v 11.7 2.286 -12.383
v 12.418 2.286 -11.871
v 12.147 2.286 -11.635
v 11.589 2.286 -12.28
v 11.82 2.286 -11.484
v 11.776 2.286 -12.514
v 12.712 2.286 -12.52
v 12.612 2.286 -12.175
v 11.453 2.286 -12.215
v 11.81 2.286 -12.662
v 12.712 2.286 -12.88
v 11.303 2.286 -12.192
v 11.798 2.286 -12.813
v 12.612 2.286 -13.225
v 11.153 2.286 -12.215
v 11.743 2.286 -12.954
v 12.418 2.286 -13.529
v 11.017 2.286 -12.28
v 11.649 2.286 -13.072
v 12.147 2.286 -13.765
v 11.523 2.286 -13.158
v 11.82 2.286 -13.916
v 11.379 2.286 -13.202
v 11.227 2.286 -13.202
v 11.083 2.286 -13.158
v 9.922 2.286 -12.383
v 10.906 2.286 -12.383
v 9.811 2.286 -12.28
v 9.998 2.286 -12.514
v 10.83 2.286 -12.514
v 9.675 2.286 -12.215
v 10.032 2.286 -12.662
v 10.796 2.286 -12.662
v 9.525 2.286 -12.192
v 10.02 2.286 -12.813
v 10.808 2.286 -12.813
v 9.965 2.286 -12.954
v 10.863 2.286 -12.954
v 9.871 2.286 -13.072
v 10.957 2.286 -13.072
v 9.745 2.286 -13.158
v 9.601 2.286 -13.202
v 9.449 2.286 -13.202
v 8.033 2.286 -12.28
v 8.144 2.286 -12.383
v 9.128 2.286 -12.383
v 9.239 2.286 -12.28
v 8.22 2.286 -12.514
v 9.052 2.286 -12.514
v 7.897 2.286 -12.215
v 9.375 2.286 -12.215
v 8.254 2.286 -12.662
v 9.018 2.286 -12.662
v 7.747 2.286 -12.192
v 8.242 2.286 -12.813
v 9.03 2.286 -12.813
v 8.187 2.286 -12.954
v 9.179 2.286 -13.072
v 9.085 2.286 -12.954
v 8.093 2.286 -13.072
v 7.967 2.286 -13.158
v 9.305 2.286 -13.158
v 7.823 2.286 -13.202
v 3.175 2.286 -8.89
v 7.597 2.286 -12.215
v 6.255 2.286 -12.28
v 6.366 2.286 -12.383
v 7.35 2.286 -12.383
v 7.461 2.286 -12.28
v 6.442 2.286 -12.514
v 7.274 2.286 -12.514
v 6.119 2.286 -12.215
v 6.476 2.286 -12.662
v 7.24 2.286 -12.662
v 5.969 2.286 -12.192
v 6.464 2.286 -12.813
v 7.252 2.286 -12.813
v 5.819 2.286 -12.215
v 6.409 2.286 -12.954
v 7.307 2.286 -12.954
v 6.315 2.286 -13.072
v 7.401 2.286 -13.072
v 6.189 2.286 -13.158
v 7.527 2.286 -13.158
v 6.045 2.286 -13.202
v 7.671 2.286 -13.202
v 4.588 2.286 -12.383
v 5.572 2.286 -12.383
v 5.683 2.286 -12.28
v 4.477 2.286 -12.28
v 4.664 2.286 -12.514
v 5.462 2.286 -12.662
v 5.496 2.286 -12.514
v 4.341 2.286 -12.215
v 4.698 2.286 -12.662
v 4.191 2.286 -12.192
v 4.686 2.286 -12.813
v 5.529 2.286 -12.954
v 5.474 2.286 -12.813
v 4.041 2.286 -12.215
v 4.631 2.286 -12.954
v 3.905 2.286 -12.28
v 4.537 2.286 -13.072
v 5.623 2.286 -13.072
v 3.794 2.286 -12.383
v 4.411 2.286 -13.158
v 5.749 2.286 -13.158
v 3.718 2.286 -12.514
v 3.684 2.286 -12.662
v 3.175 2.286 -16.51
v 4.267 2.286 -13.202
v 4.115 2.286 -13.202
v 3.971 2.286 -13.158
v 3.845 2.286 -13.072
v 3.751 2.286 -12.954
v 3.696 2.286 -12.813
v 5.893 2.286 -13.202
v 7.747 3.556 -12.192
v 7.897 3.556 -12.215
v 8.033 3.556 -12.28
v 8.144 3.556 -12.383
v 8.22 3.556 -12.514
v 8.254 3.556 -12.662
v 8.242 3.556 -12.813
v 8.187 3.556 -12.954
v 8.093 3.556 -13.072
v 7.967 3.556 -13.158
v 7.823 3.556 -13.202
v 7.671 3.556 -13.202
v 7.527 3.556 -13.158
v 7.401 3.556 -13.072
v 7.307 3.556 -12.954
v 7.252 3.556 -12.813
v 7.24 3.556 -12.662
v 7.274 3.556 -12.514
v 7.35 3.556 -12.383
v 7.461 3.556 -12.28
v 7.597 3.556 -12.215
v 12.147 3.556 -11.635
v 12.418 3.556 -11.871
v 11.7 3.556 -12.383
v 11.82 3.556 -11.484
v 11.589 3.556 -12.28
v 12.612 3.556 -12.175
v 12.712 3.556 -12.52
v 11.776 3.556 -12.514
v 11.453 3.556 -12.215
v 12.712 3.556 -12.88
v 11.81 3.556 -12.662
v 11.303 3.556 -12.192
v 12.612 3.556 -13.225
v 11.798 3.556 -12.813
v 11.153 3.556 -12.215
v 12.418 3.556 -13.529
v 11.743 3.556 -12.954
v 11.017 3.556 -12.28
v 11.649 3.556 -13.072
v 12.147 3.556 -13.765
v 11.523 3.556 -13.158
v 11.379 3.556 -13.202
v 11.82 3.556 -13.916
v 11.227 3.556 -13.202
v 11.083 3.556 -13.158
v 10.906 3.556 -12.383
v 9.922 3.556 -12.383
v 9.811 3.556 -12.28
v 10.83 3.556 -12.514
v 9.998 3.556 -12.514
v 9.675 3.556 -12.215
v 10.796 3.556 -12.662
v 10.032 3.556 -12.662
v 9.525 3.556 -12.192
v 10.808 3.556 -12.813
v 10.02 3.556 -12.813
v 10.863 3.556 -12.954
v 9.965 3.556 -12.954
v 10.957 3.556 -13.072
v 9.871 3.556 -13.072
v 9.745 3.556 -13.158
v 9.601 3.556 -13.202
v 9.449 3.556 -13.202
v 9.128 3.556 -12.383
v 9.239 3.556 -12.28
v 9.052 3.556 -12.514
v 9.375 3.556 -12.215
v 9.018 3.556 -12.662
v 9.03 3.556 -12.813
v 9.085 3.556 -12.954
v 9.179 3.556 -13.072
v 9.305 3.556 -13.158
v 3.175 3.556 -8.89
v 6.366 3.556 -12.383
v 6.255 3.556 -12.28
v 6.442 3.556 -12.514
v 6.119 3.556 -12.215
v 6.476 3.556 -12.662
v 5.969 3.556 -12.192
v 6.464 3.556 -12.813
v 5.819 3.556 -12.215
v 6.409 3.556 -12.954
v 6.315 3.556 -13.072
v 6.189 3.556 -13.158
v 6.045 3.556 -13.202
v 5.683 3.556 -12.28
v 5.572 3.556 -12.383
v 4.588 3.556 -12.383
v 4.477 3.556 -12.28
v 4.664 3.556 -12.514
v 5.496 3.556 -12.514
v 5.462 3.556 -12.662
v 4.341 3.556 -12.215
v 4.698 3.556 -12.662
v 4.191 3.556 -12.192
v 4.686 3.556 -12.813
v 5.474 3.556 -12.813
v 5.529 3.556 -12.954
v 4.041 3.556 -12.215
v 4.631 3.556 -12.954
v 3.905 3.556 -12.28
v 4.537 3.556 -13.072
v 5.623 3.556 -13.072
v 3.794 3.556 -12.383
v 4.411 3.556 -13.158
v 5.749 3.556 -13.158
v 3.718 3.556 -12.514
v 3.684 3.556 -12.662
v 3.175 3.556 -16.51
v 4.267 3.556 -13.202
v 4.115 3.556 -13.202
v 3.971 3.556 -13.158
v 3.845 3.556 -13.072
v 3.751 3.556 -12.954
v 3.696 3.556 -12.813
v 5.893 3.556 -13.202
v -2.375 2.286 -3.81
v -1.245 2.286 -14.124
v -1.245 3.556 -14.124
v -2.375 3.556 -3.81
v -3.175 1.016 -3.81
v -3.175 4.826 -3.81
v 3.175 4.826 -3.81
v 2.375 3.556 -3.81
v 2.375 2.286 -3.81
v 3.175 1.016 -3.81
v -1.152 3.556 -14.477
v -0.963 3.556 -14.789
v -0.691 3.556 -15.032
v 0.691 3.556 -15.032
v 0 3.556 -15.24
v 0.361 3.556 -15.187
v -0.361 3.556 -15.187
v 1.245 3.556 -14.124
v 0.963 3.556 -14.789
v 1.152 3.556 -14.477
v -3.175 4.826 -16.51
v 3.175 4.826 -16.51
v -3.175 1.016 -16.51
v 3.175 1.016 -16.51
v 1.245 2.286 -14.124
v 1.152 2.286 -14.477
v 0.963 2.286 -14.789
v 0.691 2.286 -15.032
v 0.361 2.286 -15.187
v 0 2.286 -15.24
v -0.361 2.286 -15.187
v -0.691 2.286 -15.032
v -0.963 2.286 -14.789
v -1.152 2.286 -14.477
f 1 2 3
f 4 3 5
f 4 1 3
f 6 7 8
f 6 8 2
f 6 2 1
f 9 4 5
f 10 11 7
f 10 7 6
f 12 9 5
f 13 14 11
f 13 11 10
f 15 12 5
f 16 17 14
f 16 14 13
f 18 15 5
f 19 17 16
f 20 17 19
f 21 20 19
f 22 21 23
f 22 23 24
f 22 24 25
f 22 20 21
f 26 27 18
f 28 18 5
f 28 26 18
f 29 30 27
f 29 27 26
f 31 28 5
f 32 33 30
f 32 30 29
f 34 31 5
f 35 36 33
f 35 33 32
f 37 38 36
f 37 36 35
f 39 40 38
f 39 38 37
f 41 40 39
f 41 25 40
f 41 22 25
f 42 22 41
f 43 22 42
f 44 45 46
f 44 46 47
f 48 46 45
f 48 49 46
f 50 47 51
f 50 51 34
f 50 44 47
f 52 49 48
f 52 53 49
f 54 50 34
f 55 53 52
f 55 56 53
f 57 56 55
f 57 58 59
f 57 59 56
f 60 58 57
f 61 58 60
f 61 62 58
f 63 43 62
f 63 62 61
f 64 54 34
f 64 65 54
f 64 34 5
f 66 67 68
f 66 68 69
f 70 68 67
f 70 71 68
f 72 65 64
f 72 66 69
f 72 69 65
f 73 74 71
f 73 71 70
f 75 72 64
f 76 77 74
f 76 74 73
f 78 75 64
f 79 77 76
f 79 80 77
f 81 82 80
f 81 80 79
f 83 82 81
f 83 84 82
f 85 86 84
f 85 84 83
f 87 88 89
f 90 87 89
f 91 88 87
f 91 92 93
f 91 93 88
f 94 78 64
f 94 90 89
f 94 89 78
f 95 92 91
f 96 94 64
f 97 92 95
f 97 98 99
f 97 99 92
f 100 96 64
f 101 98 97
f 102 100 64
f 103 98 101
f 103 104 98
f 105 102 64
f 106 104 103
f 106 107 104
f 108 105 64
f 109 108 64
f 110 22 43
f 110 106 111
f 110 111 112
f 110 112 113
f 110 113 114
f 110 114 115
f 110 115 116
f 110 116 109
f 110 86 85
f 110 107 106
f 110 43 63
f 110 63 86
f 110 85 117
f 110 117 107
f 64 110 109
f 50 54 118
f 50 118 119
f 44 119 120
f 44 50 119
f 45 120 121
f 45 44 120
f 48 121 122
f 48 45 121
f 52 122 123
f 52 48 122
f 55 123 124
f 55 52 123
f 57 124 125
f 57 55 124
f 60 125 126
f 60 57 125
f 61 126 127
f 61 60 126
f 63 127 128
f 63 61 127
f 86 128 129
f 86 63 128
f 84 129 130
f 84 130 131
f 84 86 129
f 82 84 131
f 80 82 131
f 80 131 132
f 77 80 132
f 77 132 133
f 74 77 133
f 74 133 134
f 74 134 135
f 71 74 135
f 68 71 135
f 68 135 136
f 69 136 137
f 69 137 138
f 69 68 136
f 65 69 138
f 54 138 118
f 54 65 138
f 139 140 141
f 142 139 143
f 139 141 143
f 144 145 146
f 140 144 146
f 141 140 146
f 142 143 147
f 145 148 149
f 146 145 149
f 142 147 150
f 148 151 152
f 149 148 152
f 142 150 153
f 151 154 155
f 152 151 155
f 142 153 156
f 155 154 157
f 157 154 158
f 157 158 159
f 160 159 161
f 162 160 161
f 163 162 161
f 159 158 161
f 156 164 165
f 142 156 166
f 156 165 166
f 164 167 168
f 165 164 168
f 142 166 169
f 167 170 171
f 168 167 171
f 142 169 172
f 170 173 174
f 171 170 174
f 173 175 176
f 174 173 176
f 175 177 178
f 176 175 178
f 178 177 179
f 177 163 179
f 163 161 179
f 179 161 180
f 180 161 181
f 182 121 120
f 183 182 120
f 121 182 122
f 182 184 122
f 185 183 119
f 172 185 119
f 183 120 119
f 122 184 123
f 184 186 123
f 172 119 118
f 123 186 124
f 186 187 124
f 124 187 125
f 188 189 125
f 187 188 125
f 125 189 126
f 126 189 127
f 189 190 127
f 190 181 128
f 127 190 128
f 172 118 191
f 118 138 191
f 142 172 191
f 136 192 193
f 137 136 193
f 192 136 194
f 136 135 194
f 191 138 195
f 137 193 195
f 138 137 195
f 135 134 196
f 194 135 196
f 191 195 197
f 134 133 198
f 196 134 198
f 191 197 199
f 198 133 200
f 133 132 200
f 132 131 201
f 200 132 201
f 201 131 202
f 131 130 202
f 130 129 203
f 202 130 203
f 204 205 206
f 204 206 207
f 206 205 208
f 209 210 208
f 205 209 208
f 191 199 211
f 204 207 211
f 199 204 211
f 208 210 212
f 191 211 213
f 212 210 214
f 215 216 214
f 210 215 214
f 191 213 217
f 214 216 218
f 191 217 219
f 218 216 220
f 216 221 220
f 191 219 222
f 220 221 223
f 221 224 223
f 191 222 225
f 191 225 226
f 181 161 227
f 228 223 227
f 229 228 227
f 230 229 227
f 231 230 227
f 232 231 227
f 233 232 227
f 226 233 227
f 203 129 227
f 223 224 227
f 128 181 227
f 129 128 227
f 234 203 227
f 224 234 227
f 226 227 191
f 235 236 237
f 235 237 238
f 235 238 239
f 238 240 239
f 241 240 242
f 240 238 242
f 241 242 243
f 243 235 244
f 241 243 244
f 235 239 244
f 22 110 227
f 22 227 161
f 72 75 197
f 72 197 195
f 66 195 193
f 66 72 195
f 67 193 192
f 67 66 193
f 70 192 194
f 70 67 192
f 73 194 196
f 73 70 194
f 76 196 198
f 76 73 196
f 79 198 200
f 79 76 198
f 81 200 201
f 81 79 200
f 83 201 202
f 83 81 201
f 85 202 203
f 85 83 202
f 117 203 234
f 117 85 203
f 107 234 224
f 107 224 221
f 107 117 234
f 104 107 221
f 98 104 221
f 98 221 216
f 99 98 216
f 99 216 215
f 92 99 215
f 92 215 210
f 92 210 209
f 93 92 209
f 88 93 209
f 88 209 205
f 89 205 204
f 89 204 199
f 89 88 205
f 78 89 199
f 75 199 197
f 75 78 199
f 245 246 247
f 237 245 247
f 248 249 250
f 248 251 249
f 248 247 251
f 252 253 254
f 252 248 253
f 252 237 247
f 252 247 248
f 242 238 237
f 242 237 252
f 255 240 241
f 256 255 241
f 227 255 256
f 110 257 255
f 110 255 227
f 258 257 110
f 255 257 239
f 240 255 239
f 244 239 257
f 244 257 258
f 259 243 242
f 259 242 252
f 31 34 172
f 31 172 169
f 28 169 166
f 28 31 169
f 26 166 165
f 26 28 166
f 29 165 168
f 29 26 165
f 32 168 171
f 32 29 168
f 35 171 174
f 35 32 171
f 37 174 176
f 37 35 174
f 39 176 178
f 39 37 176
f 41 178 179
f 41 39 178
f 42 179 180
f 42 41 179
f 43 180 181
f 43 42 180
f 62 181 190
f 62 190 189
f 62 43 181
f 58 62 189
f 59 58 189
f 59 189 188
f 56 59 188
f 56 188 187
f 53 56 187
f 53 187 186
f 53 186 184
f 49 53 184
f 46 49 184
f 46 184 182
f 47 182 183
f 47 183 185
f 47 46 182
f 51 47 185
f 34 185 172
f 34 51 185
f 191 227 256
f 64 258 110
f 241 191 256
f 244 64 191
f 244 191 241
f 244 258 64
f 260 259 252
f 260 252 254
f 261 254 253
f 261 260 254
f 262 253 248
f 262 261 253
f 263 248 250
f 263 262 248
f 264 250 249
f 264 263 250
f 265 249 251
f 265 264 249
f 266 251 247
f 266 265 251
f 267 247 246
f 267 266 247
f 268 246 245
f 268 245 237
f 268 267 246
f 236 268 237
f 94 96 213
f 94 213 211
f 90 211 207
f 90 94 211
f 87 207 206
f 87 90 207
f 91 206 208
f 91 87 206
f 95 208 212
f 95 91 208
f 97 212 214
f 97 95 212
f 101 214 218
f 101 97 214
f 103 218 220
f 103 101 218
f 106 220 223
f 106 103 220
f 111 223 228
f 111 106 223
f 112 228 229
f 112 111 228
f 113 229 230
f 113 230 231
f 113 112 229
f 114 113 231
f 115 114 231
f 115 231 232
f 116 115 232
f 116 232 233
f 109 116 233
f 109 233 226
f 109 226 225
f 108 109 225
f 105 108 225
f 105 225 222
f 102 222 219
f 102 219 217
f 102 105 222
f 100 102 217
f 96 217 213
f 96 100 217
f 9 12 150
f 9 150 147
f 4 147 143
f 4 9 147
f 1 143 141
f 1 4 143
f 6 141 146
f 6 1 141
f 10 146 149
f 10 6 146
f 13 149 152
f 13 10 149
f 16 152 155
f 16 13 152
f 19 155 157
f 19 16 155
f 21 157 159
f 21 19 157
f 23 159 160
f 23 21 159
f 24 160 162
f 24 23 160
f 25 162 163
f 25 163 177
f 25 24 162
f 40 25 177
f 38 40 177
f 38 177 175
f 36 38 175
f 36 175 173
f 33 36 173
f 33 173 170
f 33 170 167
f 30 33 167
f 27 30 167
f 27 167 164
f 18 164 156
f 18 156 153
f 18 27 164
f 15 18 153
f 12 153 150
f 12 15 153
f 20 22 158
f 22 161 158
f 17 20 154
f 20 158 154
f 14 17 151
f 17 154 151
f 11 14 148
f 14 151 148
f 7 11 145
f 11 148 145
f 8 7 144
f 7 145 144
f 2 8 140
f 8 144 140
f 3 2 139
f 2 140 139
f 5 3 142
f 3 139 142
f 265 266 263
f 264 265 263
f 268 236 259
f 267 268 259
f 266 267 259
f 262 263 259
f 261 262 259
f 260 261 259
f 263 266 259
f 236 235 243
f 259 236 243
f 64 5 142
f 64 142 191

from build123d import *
from build123d.topology import SkipClean

# Parameters (mm, degrees)
SKETCH1_R               = 3.429
SKETCH1_R_2             = 2.286
BOSS_EXTRUDE1_DEPTH     = 3.556
BOSS_EXTRUDE2_START     = -1.27
BOSS_EXTRUDE2_DEPTH     = 1.27
BOSS_EXTRUDE3_START     = -1.27
SKETCH2_3_R             = 2.286
SKETCH2_3_R_2           = 1.27
BOSS_EXTRUDE3_DEPTH     = 0.254
SKETCH3_R               = 0.508
CUT_EXTRUDE1_DEPTH      = 17.020635974
LPATTERN1_COUNT         = 6
LPATTERN1_PITCH         = 1.778
CUT_EXTRUDE2_DEPTH      = 17.020635974
CUT_EXTRUDE2_DEPTH_BACK = 17.020635974
SKETCH4_W               = 4.326879353
SKETCH4_H               = 6.724216597
BOSS_EXTRUDE4_START     = 2.286
SKETCH5_R               = 0.508
BOSS_EXTRUDE4_DEPTH     = 1.27
COMBINE1_OUTLINE_R      = 0.508
COMBINE1_OUTLINE_R_2    = 1.27
COMBINE1_DEPTH          = 3.556
SKETCH6_W               = 6.35
SKETCH6_H               = 12.7
BOSS_EXTRUDE5_DEPTH     = 1.27
BOSS_EXTRUDE6_START     = -1.27
SKETCH6_2_W             = 6.35
SKETCH6_2_H             = 12.7
BOSS_EXTRUDE6_DEPTH     = 1.27
FILLET1_R               = 1.27


# Read off the part's stored shape, not the designer's step: Combine1
with BuildPart() as part:
    # Sketch1 → Boss-Extrude1 (new body)
    with BuildSketch(Plane(origin=(0, 0, 0), x_dir=(1, 0, 0), z_dir=(0, 1, 0))):
        with Locations(Location((0, 0, 0), (0, 0, 270))):
            Circle(SKETCH1_R)
        with Locations(Location((0, 0, 0), (0, 0, 270))):
            Circle(SKETCH1_R_2, mode=Mode.SUBTRACT)
    extrude(amount=BOSS_EXTRUDE1_DEPTH)

    # Sketch2 → Boss-Extrude2 (add)
    with BuildSketch(Plane(origin=(0, 3.556, 0), x_dir=(1, 0, 0), z_dir=(0, 1, 0)).offset(BOSS_EXTRUDE2_START)):
        with BuildLine():
            ThreePointArc((-2.54, 2.303571358), (-1.389081498, 3.135042837), (0, 3.429))
            Line((0, 3.429), (0, 15.24))
            ThreePointArc((0, 15.24), (-0.835660201, 14.92028345), (-1.244511661, 14.124427226))
            Line((-1.244511661, 14.124427226), (-2.54, 2.303571358))
        make_face()
        with BuildLine():
            Line((0, 15.24), (0, 3.429))
            ThreePointArc((0, 3.429), (1.389081498, 3.135042837), (2.54, 2.303571358))
            Line((2.54, 2.303571358), (1.244511661, 14.124427226))
            ThreePointArc((1.244511661, 14.124427226), (0.835660201, 14.92028345), (0, 15.24))
        make_face()
    extrude(amount=BOSS_EXTRUDE2_DEPTH)

    # Sketch2<3> → Boss-Extrude3 (add)
    with BuildSketch(Plane(origin=(0, 3.556, 0), x_dir=(1, 0, 0), z_dir=(0, 1, 0)).offset(BOSS_EXTRUDE3_START)):
        with Locations(Location((0, 0, 0), (0, 0, 270))):
            Circle(SKETCH2_3_R)
        with Locations(Location((0, 0, 0), (0, 0, 270))):
            Circle(SKETCH2_3_R_2, mode=Mode.SUBTRACT)
    extrude(amount=BOSS_EXTRUDE3_DEPTH)

    # Sketch3 → Cut-Extrude1 (cut, through all)
    with BuildSketch(Plane(origin=(0, 3.556, 0), x_dir=(1, 0, 0), z_dir=(0, 1, 0))):
        with Locations(Location((0, 5.08, 0), (0, 0, 270))):
            Circle(SKETCH3_R)
    cut_extrude1 = extrude(amount=-CUT_EXTRUDE1_DEPTH, mode=Mode.SUBTRACT)

    # LPattern1: Cut-Extrude1 ×6
    with Locations(*[(0, 0, -i * LPATTERN1_PITCH) for i in range(1, LPATTERN1_COUNT)]):
        add(cut_extrude1, mode=Mode.SUBTRACT)

    # Sketch4 → Cut-Extrude2 (cut, two sides: drawn at the far end of the back side and taken through both)
    with BuildSketch(Plane(origin=(0, 0, 0), x_dir=(0, 0, -1), z_dir=(1, 0, 0)).offset(-CUT_EXTRUDE2_DEPTH_BACK)):
        with Locations((-2.163439677, 3.362108299)):
            Rectangle(SKETCH4_W, SKETCH4_H)
    extrude(amount=CUT_EXTRUDE2_DEPTH + CUT_EXTRUDE2_DEPTH_BACK, mode=Mode.SUBTRACT)

    # Mirror1: part across plane


with BuildPart() as part_1:
    with SkipClean():  # the faces are left unmerged after this step: merging them gives an invalid solid
        add(part.part)
        add(part.part.mirror(Plane.XY))


with BuildPart() as body_2:
    # Sketch5 → Boss-Extrude4 (new body)
    with BuildSketch(Plane(origin=(0, 0, 0), x_dir=(1, 0, 0), z_dir=(0, 1, 0)).offset(BOSS_EXTRUDE4_START)):
        Polygon((3.175, 16.51), (15.875, 12.7), (3.175, 8.89), (3.175, 3.81), (-3.175, 3.81), (-3.175, 16.51), align=None)
        with Locations(Location((4.191, 12.7, 0), (0, 0, 270))):
            Circle(SKETCH5_R, mode=Mode.SUBTRACT)
        with Locations(Location((5.969, 12.7, 0), (0, 0, 270))):
            Circle(SKETCH5_R, mode=Mode.SUBTRACT)
        with Locations(Location((7.747, 12.7, 0), (0, 0, 270))):
            Circle(SKETCH5_R, mode=Mode.SUBTRACT)
        with Locations(Location((9.525, 12.7, 0), (0, 0, 270))):
            Circle(SKETCH5_R, mode=Mode.SUBTRACT)
        with Locations(Location((11.303, 12.7, 0), (0, 0, 270))):
            Circle(SKETCH5_R, mode=Mode.SUBTRACT)
    extrude(amount=BOSS_EXTRUDE4_DEPTH)


with BuildPart() as combine1_tool:
    # Combine1 outline → Combine1 (new body)
    with BuildSketch(Plane(origin=(0, 0, 0), x_dir=(1, 0, 0), z_dir=(0, 1, 0))):
        with BuildLine():
            ThreePointArc((2.54, -2.303571358), (3.429, 0), (2.54, 2.303571358))
            Line((2.54, 2.303571358), (1.244511661, 14.124427226))
            ThreePointArc((1.244511661, 14.124427226), (0, 15.24), (-1.244511661, 14.124427226))
            Line((-1.244511661, 14.124427226), (-2.54, 2.303571358))
            ThreePointArc((-2.54, 2.303571358), (-3.429, 0), (-2.54, -2.303571358))
            Line((-2.54, -2.303571358), (-1.244511661, -14.124427226))
            ThreePointArc((-1.244511661, -14.124427226), (0, -15.24), (1.244511661, -14.124427226))
            Line((1.244511661, -14.124427226), (2.54, -2.303571358))
        make_face()
        with Locations((0, -5.08)):
            Circle(COMBINE1_OUTLINE_R, mode=Mode.SUBTRACT)
        with Locations((0, -13.97)):
            Circle(COMBINE1_OUTLINE_R, mode=Mode.SUBTRACT)
        with Locations((0, -12.192)):
            Circle(COMBINE1_OUTLINE_R, mode=Mode.SUBTRACT)
        with Locations((0, -10.414)):
            Circle(COMBINE1_OUTLINE_R, mode=Mode.SUBTRACT)
        with Locations((0, -8.636)):
            Circle(COMBINE1_OUTLINE_R, mode=Mode.SUBTRACT)
        with Locations((0, -6.858)):
            Circle(COMBINE1_OUTLINE_R, mode=Mode.SUBTRACT)
        Circle(COMBINE1_OUTLINE_R_2, mode=Mode.SUBTRACT)
    extrude(amount=COMBINE1_DEPTH)


with BuildPart() as part_2:
    add(part_1.part)

    # Combine1: cut by combine1_tool
    add(combine1_tool.part, mode=Mode.SUBTRACT)


with BuildPart() as body_2_1:
    add(body_2.part)

    # Combine1: cut by combine1_tool
    add(combine1_tool.part, mode=Mode.SUBTRACT)

    # Sketch6 → Boss-Extrude5 (add)
    with BuildSketch(Plane.XZ.offset(-2.286)):
        with Locations((0, -10.16)):
            Rectangle(SKETCH6_W, SKETCH6_H)
    extrude(amount=BOSS_EXTRUDE5_DEPTH)

    # Sketch6<2> → Boss-Extrude6 (add)
    with BuildSketch(Plane.XZ.offset(-2.286).offset(BOSS_EXTRUDE6_START)):
        with Locations((0, -10.16)):
            Rectangle(SKETCH6_2_W, SKETCH6_2_H)
    extrude(amount=-BOSS_EXTRUDE6_DEPTH)

    # Fillet1
    fillet1_edges = [body_2_1.edges().sort_by_distance(p)[0] for p in [
        (15.875, 2.921, -12.7),
    ]]
    fillet(fillet1_edges, radius=FILLET1_R)


solid = body_2_1.part
